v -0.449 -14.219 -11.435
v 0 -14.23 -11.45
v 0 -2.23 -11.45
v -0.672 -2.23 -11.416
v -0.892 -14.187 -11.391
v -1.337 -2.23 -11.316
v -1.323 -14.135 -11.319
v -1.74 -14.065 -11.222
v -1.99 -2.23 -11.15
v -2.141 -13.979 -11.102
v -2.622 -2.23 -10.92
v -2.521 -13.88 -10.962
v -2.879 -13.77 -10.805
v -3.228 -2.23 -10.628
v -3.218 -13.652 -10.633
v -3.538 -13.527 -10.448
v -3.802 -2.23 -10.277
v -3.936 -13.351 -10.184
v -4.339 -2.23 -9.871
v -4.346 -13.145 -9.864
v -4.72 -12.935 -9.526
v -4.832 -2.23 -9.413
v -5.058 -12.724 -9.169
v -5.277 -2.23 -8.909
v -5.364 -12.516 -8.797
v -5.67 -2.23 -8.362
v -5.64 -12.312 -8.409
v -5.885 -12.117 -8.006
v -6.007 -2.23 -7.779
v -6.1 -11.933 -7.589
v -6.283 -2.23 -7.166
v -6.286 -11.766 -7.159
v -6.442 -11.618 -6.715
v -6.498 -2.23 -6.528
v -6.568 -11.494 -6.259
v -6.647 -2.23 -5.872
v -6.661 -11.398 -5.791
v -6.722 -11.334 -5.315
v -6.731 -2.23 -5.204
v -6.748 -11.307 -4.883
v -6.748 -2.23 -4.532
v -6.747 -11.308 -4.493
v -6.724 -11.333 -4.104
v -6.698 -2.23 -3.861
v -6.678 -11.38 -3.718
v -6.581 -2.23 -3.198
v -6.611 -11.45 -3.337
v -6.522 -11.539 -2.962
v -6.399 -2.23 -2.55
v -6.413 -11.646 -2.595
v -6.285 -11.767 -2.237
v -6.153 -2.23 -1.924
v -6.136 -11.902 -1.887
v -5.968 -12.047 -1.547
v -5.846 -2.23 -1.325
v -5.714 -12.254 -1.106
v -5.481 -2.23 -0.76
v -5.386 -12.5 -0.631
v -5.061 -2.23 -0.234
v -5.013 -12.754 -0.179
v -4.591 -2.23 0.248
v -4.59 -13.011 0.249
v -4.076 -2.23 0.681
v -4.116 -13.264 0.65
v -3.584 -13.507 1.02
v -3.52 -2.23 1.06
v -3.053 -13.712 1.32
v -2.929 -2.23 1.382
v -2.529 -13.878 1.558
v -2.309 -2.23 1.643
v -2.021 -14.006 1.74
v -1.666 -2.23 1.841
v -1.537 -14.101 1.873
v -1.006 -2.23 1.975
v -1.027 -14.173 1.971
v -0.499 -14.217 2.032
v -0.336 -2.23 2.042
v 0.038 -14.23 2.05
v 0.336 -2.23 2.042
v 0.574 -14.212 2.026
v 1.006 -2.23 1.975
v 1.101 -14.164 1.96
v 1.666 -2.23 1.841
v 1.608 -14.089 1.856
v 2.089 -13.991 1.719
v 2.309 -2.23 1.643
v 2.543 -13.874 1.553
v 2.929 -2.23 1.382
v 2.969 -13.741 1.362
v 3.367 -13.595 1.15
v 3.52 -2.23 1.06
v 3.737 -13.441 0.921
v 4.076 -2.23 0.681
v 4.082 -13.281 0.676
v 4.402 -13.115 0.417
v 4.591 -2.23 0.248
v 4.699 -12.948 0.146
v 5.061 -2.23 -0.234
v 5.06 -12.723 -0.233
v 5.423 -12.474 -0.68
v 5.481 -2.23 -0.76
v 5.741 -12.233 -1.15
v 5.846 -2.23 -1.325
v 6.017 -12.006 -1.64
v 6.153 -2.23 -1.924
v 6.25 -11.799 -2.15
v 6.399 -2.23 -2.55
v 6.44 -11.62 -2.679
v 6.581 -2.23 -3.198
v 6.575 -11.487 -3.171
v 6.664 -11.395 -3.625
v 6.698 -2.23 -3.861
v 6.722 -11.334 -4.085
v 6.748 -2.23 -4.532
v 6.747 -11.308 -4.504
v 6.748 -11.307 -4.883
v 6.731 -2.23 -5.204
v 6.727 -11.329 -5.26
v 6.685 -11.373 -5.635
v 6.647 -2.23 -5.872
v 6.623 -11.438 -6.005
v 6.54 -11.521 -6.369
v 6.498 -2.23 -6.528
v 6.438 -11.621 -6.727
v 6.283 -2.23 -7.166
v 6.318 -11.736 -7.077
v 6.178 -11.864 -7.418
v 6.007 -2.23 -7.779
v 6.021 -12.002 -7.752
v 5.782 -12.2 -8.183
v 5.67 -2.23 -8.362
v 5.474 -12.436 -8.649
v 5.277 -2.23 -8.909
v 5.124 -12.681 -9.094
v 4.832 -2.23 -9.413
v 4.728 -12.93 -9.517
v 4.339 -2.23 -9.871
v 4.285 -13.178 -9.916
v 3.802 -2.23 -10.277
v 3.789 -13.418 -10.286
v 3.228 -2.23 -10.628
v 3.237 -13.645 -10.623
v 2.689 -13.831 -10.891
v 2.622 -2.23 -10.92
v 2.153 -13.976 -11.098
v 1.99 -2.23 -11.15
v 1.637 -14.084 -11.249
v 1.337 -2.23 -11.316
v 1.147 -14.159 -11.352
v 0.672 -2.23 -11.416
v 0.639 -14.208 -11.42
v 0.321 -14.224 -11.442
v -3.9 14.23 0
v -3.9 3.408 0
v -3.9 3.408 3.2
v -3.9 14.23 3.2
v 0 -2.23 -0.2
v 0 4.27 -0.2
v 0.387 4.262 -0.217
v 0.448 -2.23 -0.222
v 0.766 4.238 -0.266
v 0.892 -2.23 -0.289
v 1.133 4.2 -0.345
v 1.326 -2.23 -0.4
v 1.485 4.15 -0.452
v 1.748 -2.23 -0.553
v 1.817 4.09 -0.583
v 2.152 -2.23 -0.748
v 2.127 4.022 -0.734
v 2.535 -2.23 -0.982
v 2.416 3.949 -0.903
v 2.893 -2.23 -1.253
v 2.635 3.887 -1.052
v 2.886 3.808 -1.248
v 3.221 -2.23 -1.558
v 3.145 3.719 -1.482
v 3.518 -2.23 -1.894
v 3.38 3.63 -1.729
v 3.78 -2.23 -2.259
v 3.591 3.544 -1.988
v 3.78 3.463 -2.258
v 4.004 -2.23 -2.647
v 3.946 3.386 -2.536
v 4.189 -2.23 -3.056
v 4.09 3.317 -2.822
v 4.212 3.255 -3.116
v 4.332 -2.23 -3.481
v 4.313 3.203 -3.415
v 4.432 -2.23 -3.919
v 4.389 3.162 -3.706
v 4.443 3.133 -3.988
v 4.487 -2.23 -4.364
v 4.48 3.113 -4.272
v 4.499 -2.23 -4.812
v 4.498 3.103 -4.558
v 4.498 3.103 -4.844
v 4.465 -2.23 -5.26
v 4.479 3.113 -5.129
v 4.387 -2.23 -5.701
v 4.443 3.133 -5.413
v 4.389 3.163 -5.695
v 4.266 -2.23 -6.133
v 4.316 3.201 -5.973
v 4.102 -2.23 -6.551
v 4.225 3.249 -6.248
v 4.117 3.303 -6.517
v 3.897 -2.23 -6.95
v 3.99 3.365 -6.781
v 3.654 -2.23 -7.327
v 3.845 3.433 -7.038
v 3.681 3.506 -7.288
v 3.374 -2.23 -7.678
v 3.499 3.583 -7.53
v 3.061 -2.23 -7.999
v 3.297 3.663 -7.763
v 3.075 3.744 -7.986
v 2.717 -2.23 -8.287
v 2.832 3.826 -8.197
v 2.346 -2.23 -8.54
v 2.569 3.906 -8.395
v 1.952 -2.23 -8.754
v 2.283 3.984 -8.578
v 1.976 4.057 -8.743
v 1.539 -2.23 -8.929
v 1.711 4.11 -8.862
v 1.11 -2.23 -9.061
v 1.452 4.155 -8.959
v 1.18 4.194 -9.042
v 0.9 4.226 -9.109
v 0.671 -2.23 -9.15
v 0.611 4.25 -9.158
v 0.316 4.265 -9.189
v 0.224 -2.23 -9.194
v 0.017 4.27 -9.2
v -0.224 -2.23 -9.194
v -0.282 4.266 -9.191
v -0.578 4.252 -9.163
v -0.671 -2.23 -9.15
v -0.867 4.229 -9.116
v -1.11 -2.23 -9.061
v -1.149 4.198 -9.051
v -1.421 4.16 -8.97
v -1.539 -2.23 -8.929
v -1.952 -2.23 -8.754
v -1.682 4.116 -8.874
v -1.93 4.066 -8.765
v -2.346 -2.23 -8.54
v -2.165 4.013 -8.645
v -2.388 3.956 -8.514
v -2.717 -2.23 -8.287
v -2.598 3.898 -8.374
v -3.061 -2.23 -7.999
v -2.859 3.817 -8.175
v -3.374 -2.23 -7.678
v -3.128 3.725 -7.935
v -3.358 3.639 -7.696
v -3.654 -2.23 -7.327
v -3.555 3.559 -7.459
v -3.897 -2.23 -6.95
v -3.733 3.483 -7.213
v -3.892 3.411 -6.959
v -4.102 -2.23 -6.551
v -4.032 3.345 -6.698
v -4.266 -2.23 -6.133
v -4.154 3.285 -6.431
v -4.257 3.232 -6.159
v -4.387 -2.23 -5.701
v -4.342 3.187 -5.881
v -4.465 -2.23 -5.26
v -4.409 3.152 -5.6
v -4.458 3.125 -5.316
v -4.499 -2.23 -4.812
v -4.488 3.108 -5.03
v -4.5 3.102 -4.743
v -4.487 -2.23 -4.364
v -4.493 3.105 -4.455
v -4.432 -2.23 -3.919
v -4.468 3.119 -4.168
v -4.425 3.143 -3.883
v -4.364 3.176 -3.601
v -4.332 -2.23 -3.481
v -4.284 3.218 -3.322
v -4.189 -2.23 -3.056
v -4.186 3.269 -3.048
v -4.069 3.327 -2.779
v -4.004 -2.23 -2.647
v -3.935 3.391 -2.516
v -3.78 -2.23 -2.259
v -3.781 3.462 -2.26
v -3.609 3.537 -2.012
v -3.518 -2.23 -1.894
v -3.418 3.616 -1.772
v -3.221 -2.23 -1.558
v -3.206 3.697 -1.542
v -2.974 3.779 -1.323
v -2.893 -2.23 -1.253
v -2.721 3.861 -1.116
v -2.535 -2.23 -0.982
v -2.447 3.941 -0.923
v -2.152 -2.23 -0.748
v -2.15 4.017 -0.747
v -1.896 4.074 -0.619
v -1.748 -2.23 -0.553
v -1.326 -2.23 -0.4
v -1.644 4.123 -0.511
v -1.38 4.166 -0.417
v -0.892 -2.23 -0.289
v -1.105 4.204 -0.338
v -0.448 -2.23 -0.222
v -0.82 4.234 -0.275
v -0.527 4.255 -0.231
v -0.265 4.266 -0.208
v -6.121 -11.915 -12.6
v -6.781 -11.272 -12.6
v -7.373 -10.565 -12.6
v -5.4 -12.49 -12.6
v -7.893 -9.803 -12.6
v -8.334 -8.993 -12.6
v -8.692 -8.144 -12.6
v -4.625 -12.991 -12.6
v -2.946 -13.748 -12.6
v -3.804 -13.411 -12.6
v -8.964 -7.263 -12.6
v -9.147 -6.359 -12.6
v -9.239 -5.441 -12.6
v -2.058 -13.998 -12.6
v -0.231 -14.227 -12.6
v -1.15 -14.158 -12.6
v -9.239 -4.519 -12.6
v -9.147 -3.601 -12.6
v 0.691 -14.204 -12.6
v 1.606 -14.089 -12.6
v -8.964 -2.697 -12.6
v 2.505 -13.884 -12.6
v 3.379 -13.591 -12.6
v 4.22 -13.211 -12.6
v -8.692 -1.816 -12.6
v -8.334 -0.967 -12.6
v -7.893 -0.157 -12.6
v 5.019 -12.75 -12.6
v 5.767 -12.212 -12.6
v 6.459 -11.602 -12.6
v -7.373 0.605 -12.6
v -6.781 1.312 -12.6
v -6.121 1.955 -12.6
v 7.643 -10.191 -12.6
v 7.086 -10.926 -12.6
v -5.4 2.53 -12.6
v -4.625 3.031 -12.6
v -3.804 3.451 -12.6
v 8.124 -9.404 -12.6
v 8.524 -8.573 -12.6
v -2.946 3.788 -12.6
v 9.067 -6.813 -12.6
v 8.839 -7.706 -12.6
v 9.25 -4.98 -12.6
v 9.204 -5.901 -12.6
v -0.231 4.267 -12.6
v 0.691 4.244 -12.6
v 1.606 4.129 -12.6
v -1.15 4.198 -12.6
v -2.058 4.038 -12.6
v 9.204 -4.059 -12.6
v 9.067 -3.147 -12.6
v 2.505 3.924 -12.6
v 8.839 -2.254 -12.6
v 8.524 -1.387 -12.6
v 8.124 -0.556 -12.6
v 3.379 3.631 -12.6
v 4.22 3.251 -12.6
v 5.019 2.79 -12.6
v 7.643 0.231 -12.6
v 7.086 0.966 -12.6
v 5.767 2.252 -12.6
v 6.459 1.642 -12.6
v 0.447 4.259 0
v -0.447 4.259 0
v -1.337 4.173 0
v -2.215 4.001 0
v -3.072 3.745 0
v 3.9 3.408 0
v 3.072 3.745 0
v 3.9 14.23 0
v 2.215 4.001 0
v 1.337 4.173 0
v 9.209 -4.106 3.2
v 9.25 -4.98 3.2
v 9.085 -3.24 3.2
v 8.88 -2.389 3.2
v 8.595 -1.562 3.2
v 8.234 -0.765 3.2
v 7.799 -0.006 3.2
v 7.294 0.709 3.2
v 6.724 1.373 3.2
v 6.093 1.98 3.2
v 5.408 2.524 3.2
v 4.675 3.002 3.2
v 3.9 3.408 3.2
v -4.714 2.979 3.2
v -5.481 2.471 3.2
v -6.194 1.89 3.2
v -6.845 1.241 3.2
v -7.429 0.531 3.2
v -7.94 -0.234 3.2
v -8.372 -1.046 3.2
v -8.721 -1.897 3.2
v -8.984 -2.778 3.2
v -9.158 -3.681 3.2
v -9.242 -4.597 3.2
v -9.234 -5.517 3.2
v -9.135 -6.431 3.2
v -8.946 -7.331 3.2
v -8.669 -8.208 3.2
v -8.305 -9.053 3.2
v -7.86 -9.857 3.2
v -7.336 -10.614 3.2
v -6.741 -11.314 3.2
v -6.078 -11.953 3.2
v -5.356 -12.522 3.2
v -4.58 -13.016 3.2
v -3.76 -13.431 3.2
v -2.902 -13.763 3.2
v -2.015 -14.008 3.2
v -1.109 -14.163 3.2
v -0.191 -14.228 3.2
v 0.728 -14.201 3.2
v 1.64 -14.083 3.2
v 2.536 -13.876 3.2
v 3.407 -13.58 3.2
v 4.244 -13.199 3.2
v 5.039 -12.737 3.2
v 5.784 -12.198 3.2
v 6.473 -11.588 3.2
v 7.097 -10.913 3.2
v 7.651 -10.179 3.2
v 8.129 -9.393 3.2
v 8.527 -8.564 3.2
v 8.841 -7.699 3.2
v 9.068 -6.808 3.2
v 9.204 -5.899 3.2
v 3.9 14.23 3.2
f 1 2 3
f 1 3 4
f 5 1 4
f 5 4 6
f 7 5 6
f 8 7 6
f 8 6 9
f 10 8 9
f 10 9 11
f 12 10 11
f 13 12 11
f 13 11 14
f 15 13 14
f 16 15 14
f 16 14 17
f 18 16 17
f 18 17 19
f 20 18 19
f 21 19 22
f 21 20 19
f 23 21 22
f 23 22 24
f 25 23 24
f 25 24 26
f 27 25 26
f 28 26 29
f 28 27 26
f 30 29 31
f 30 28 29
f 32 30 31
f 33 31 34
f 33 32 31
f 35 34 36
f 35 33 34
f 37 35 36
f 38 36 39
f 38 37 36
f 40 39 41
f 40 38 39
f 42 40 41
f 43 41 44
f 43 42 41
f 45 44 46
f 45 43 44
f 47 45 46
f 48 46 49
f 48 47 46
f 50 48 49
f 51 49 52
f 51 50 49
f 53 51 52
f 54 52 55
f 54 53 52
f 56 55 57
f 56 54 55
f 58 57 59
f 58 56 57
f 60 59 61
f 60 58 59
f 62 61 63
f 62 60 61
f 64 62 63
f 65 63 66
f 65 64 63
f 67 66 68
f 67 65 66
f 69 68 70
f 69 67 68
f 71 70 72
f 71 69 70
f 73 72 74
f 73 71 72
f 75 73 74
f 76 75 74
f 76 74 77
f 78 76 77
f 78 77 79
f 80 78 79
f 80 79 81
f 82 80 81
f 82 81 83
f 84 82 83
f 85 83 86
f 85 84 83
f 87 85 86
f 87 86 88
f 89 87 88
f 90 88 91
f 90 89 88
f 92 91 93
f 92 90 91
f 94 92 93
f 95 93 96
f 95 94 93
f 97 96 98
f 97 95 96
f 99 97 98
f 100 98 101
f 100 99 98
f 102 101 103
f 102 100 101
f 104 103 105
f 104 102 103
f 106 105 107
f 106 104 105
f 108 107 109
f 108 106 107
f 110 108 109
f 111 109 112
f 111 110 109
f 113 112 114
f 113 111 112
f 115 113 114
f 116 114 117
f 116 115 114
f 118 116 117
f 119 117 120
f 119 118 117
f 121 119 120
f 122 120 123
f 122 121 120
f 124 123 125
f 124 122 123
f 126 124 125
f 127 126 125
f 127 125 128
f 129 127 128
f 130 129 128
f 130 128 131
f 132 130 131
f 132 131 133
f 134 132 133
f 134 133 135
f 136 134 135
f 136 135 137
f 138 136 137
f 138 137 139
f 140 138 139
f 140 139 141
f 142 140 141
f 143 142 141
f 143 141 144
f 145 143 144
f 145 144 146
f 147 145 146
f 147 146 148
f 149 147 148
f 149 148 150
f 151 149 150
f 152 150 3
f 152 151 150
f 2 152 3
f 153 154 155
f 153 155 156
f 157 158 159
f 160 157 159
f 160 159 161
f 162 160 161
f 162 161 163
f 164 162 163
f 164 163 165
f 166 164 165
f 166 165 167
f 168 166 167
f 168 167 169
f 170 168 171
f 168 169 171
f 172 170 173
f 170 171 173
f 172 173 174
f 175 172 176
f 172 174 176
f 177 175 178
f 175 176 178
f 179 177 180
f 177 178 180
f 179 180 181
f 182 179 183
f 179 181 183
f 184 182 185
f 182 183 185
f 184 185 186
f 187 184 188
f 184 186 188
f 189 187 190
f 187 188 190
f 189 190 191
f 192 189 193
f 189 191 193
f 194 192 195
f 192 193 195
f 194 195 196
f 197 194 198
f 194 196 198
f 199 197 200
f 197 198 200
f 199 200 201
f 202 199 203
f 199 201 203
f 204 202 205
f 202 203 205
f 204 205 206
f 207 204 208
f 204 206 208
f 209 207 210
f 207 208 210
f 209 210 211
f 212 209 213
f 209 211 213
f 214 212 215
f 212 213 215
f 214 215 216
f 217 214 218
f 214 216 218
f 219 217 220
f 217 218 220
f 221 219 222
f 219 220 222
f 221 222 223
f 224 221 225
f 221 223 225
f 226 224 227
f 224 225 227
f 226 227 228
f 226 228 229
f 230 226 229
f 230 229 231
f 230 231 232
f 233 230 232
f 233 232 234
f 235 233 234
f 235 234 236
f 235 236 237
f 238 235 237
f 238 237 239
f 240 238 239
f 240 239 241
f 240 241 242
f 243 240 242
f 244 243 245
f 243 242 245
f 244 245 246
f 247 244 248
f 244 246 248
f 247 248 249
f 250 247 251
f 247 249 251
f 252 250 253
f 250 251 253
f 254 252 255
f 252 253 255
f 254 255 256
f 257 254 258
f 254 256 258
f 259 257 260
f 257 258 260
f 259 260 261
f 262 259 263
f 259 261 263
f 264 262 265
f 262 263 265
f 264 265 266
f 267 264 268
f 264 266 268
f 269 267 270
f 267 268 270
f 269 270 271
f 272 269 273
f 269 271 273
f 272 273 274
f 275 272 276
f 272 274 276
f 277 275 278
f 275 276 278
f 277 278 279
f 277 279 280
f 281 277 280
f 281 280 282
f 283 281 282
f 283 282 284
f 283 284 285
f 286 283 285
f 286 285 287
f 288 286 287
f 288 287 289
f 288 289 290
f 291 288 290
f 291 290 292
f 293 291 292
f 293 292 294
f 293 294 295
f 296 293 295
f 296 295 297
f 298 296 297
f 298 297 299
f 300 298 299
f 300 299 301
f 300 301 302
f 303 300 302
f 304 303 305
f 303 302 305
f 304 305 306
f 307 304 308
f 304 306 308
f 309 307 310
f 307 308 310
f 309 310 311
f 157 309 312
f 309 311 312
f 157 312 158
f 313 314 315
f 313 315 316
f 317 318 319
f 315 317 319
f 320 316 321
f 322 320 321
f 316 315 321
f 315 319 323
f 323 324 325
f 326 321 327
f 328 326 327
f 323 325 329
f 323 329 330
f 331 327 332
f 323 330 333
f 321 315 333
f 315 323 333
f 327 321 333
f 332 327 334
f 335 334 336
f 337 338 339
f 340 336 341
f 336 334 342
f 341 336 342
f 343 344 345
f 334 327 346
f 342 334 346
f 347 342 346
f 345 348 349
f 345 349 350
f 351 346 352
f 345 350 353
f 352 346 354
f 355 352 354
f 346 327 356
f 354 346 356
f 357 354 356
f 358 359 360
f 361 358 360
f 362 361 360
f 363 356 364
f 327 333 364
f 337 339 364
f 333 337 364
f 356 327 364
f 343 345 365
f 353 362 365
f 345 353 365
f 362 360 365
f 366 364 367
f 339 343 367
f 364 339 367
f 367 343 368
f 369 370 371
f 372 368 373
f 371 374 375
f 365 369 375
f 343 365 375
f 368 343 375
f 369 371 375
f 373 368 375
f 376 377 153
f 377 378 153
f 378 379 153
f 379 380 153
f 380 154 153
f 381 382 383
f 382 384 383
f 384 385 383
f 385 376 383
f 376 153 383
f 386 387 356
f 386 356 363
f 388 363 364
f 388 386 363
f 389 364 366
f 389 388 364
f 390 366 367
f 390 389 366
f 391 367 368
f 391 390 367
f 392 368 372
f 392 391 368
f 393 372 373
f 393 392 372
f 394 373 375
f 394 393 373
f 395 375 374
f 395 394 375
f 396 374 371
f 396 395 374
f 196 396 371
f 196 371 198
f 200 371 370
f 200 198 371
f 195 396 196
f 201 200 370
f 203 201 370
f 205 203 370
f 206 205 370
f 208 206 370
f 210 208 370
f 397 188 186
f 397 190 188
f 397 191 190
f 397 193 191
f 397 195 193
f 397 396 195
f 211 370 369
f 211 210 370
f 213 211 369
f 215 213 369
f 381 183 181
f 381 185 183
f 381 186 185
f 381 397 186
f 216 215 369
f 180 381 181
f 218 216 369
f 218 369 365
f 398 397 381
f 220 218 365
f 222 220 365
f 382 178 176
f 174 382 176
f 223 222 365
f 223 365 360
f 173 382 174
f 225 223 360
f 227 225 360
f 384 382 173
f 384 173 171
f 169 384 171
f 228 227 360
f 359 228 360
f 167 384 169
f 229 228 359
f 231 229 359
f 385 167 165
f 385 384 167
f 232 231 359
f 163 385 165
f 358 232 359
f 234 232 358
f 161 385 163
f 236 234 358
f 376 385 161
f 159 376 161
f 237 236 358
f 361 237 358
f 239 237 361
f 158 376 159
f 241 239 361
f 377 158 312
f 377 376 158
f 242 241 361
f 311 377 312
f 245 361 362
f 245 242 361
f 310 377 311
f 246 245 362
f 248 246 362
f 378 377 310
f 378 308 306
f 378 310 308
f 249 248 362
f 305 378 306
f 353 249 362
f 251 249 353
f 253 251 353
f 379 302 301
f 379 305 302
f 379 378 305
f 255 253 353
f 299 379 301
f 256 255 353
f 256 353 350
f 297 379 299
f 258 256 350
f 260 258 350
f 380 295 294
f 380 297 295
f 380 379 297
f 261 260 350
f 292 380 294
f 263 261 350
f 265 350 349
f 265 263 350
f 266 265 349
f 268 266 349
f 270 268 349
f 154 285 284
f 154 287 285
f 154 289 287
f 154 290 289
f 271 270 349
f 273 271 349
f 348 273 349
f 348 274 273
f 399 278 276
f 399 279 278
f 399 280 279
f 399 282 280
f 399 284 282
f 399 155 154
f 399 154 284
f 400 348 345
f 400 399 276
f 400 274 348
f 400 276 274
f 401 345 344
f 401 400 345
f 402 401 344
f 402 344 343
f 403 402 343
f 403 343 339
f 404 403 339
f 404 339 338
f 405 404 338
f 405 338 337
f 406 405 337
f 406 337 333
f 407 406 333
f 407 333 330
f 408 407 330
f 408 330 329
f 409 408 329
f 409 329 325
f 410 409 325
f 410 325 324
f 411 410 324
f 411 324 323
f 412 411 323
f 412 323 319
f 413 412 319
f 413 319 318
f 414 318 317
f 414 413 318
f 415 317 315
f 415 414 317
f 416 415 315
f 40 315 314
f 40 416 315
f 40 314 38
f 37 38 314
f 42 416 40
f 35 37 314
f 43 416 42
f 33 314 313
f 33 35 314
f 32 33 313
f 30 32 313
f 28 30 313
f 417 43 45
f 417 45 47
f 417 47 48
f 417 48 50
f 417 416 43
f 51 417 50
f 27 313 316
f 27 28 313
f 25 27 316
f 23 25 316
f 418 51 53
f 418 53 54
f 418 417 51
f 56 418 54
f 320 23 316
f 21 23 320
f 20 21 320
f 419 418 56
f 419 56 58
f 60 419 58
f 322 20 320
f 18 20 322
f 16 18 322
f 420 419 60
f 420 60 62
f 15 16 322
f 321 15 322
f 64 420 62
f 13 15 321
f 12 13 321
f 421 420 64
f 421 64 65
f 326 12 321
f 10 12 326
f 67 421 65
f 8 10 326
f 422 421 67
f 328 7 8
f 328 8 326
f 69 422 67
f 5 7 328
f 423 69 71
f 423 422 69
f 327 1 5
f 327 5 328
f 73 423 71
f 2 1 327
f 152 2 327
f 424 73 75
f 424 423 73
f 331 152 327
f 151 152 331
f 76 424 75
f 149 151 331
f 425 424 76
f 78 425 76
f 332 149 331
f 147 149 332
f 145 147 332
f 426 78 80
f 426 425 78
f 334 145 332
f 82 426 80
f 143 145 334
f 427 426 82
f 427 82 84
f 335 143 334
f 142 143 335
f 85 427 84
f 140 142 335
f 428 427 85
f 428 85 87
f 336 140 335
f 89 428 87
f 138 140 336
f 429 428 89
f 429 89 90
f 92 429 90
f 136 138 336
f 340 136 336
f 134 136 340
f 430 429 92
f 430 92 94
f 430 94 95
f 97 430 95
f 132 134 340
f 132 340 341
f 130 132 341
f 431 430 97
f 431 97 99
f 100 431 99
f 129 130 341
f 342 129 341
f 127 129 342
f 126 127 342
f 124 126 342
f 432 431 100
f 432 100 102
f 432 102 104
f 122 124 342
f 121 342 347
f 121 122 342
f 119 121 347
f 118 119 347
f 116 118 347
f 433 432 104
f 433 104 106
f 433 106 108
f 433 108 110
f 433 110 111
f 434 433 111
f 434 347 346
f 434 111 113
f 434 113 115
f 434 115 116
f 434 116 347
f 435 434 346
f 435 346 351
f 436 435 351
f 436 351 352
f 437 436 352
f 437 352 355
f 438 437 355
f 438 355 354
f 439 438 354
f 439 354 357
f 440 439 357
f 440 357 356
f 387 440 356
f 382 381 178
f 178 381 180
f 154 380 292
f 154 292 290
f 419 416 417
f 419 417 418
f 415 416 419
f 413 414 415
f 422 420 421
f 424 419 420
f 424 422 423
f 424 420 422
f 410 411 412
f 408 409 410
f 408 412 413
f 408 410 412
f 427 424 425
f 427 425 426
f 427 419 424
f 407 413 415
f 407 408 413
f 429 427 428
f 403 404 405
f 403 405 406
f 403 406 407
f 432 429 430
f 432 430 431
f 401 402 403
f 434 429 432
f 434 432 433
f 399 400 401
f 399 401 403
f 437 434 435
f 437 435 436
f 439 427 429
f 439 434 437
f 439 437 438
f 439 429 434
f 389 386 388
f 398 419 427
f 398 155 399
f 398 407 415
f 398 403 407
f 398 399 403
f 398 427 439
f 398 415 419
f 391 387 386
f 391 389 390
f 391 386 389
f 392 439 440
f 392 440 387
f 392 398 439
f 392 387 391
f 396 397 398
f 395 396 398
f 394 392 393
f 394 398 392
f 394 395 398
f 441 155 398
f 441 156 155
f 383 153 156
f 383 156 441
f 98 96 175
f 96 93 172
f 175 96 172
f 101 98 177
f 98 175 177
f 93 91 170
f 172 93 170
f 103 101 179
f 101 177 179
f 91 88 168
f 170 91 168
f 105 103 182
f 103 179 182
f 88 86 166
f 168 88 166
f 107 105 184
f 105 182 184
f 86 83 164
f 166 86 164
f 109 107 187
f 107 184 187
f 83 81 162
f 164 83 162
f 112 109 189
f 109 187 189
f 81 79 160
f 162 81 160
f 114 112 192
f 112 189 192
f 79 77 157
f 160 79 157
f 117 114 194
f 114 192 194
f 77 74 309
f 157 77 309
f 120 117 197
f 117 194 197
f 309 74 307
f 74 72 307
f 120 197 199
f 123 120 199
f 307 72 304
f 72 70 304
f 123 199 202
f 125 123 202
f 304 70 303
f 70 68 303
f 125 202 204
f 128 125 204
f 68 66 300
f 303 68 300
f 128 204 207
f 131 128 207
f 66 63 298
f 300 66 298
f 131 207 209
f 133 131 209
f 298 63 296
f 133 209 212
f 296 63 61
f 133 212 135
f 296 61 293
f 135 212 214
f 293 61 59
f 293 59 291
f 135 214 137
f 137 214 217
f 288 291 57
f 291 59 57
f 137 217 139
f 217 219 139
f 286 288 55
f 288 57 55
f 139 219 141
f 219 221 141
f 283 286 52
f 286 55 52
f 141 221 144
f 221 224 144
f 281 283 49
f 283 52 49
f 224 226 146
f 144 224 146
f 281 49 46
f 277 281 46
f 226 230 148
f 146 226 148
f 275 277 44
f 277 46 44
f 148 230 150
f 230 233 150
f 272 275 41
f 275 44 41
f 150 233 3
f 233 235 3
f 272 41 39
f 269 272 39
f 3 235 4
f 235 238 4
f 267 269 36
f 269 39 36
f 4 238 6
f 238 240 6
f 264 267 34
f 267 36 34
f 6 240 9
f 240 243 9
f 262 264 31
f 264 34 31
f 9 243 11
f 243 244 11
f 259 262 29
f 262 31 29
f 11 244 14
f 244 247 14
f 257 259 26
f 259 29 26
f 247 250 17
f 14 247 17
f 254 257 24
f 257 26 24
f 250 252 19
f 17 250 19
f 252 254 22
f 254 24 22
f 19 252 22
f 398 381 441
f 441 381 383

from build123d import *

# Parameters (mm, degrees)
SKETCH_1_W          = 7.8
SKETCH_1_H          = 28.46
EXTRUDE_1_DEPTH     = 3.2
SKETCH_4_W          = 7.8
SKETCH_4_H          = 7.178435562
CUT_EXTRUDE_1_DEPTH = 16.097777982
SKETCH_2_R          = 9.25
EXTRUDE_2_DEPTH     = 15.8
SKETCH_5_R          = 4.5
CUT_EXTRUDE_2_DEPTH = 33.469895288
SKETCH_6_R          = 6.75
CUT_EXTRUDE_3_DEPTH = 12


with BuildPart() as part:
    # 草图1 → 凸台-拉伸1 (new body)
    with BuildSketch(Plane.XY):
        Rectangle(SKETCH_1_W, SKETCH_1_H)
    extrude(amount=EXTRUDE_1_DEPTH)

    # 草图4 → 切除-拉伸1 (cut, through all)
    with BuildSketch(Plane(origin=(0, 0, 0), x_dir=(-1, 0, 0), z_dir=(0, 0, -1))):
        with Locations((0, -10.640782219)):
            Rectangle(SKETCH_4_W, SKETCH_4_H)
    extrude(amount=-CUT_EXTRUDE_1_DEPTH, mode=Mode.SUBTRACT)

    # 草图2 → 凸台-拉伸2 (add)
    with BuildSketch(Plane.XY.offset(3.2)):
        with Locations((0, -4.98)):
            Circle(SKETCH_2_R)
    extrude(amount=-EXTRUDE_2_DEPTH)

    # 草图5 → 切除-拉伸2 (cut, through all)
    with BuildSketch(Plane(origin=(0, 14.23, 0), x_dir=(1, 0, 0), z_dir=(0, 1, 0))):
        with Locations(Location((0, 4.7, 0), (0, 0, 270))):
            Circle(SKETCH_5_R)
    extrude(amount=-CUT_EXTRUDE_2_DEPTH, mode=Mode.SUBTRACT)

    # 草图6 → 切除-拉伸3 (cut)
    with BuildSketch(Plane(origin=(0, -14.23, 0), x_dir=(-1, 0, 0), z_dir=(0, 1, 0))):
        with Locations(Location((0, -4.7, 0), (0, 0, 270))):
            Circle(SKETCH_6_R)
    extrude(amount=CUT_EXTRUDE_3_DEPTH, mode=Mode.SUBTRACT)


solid = part.part
